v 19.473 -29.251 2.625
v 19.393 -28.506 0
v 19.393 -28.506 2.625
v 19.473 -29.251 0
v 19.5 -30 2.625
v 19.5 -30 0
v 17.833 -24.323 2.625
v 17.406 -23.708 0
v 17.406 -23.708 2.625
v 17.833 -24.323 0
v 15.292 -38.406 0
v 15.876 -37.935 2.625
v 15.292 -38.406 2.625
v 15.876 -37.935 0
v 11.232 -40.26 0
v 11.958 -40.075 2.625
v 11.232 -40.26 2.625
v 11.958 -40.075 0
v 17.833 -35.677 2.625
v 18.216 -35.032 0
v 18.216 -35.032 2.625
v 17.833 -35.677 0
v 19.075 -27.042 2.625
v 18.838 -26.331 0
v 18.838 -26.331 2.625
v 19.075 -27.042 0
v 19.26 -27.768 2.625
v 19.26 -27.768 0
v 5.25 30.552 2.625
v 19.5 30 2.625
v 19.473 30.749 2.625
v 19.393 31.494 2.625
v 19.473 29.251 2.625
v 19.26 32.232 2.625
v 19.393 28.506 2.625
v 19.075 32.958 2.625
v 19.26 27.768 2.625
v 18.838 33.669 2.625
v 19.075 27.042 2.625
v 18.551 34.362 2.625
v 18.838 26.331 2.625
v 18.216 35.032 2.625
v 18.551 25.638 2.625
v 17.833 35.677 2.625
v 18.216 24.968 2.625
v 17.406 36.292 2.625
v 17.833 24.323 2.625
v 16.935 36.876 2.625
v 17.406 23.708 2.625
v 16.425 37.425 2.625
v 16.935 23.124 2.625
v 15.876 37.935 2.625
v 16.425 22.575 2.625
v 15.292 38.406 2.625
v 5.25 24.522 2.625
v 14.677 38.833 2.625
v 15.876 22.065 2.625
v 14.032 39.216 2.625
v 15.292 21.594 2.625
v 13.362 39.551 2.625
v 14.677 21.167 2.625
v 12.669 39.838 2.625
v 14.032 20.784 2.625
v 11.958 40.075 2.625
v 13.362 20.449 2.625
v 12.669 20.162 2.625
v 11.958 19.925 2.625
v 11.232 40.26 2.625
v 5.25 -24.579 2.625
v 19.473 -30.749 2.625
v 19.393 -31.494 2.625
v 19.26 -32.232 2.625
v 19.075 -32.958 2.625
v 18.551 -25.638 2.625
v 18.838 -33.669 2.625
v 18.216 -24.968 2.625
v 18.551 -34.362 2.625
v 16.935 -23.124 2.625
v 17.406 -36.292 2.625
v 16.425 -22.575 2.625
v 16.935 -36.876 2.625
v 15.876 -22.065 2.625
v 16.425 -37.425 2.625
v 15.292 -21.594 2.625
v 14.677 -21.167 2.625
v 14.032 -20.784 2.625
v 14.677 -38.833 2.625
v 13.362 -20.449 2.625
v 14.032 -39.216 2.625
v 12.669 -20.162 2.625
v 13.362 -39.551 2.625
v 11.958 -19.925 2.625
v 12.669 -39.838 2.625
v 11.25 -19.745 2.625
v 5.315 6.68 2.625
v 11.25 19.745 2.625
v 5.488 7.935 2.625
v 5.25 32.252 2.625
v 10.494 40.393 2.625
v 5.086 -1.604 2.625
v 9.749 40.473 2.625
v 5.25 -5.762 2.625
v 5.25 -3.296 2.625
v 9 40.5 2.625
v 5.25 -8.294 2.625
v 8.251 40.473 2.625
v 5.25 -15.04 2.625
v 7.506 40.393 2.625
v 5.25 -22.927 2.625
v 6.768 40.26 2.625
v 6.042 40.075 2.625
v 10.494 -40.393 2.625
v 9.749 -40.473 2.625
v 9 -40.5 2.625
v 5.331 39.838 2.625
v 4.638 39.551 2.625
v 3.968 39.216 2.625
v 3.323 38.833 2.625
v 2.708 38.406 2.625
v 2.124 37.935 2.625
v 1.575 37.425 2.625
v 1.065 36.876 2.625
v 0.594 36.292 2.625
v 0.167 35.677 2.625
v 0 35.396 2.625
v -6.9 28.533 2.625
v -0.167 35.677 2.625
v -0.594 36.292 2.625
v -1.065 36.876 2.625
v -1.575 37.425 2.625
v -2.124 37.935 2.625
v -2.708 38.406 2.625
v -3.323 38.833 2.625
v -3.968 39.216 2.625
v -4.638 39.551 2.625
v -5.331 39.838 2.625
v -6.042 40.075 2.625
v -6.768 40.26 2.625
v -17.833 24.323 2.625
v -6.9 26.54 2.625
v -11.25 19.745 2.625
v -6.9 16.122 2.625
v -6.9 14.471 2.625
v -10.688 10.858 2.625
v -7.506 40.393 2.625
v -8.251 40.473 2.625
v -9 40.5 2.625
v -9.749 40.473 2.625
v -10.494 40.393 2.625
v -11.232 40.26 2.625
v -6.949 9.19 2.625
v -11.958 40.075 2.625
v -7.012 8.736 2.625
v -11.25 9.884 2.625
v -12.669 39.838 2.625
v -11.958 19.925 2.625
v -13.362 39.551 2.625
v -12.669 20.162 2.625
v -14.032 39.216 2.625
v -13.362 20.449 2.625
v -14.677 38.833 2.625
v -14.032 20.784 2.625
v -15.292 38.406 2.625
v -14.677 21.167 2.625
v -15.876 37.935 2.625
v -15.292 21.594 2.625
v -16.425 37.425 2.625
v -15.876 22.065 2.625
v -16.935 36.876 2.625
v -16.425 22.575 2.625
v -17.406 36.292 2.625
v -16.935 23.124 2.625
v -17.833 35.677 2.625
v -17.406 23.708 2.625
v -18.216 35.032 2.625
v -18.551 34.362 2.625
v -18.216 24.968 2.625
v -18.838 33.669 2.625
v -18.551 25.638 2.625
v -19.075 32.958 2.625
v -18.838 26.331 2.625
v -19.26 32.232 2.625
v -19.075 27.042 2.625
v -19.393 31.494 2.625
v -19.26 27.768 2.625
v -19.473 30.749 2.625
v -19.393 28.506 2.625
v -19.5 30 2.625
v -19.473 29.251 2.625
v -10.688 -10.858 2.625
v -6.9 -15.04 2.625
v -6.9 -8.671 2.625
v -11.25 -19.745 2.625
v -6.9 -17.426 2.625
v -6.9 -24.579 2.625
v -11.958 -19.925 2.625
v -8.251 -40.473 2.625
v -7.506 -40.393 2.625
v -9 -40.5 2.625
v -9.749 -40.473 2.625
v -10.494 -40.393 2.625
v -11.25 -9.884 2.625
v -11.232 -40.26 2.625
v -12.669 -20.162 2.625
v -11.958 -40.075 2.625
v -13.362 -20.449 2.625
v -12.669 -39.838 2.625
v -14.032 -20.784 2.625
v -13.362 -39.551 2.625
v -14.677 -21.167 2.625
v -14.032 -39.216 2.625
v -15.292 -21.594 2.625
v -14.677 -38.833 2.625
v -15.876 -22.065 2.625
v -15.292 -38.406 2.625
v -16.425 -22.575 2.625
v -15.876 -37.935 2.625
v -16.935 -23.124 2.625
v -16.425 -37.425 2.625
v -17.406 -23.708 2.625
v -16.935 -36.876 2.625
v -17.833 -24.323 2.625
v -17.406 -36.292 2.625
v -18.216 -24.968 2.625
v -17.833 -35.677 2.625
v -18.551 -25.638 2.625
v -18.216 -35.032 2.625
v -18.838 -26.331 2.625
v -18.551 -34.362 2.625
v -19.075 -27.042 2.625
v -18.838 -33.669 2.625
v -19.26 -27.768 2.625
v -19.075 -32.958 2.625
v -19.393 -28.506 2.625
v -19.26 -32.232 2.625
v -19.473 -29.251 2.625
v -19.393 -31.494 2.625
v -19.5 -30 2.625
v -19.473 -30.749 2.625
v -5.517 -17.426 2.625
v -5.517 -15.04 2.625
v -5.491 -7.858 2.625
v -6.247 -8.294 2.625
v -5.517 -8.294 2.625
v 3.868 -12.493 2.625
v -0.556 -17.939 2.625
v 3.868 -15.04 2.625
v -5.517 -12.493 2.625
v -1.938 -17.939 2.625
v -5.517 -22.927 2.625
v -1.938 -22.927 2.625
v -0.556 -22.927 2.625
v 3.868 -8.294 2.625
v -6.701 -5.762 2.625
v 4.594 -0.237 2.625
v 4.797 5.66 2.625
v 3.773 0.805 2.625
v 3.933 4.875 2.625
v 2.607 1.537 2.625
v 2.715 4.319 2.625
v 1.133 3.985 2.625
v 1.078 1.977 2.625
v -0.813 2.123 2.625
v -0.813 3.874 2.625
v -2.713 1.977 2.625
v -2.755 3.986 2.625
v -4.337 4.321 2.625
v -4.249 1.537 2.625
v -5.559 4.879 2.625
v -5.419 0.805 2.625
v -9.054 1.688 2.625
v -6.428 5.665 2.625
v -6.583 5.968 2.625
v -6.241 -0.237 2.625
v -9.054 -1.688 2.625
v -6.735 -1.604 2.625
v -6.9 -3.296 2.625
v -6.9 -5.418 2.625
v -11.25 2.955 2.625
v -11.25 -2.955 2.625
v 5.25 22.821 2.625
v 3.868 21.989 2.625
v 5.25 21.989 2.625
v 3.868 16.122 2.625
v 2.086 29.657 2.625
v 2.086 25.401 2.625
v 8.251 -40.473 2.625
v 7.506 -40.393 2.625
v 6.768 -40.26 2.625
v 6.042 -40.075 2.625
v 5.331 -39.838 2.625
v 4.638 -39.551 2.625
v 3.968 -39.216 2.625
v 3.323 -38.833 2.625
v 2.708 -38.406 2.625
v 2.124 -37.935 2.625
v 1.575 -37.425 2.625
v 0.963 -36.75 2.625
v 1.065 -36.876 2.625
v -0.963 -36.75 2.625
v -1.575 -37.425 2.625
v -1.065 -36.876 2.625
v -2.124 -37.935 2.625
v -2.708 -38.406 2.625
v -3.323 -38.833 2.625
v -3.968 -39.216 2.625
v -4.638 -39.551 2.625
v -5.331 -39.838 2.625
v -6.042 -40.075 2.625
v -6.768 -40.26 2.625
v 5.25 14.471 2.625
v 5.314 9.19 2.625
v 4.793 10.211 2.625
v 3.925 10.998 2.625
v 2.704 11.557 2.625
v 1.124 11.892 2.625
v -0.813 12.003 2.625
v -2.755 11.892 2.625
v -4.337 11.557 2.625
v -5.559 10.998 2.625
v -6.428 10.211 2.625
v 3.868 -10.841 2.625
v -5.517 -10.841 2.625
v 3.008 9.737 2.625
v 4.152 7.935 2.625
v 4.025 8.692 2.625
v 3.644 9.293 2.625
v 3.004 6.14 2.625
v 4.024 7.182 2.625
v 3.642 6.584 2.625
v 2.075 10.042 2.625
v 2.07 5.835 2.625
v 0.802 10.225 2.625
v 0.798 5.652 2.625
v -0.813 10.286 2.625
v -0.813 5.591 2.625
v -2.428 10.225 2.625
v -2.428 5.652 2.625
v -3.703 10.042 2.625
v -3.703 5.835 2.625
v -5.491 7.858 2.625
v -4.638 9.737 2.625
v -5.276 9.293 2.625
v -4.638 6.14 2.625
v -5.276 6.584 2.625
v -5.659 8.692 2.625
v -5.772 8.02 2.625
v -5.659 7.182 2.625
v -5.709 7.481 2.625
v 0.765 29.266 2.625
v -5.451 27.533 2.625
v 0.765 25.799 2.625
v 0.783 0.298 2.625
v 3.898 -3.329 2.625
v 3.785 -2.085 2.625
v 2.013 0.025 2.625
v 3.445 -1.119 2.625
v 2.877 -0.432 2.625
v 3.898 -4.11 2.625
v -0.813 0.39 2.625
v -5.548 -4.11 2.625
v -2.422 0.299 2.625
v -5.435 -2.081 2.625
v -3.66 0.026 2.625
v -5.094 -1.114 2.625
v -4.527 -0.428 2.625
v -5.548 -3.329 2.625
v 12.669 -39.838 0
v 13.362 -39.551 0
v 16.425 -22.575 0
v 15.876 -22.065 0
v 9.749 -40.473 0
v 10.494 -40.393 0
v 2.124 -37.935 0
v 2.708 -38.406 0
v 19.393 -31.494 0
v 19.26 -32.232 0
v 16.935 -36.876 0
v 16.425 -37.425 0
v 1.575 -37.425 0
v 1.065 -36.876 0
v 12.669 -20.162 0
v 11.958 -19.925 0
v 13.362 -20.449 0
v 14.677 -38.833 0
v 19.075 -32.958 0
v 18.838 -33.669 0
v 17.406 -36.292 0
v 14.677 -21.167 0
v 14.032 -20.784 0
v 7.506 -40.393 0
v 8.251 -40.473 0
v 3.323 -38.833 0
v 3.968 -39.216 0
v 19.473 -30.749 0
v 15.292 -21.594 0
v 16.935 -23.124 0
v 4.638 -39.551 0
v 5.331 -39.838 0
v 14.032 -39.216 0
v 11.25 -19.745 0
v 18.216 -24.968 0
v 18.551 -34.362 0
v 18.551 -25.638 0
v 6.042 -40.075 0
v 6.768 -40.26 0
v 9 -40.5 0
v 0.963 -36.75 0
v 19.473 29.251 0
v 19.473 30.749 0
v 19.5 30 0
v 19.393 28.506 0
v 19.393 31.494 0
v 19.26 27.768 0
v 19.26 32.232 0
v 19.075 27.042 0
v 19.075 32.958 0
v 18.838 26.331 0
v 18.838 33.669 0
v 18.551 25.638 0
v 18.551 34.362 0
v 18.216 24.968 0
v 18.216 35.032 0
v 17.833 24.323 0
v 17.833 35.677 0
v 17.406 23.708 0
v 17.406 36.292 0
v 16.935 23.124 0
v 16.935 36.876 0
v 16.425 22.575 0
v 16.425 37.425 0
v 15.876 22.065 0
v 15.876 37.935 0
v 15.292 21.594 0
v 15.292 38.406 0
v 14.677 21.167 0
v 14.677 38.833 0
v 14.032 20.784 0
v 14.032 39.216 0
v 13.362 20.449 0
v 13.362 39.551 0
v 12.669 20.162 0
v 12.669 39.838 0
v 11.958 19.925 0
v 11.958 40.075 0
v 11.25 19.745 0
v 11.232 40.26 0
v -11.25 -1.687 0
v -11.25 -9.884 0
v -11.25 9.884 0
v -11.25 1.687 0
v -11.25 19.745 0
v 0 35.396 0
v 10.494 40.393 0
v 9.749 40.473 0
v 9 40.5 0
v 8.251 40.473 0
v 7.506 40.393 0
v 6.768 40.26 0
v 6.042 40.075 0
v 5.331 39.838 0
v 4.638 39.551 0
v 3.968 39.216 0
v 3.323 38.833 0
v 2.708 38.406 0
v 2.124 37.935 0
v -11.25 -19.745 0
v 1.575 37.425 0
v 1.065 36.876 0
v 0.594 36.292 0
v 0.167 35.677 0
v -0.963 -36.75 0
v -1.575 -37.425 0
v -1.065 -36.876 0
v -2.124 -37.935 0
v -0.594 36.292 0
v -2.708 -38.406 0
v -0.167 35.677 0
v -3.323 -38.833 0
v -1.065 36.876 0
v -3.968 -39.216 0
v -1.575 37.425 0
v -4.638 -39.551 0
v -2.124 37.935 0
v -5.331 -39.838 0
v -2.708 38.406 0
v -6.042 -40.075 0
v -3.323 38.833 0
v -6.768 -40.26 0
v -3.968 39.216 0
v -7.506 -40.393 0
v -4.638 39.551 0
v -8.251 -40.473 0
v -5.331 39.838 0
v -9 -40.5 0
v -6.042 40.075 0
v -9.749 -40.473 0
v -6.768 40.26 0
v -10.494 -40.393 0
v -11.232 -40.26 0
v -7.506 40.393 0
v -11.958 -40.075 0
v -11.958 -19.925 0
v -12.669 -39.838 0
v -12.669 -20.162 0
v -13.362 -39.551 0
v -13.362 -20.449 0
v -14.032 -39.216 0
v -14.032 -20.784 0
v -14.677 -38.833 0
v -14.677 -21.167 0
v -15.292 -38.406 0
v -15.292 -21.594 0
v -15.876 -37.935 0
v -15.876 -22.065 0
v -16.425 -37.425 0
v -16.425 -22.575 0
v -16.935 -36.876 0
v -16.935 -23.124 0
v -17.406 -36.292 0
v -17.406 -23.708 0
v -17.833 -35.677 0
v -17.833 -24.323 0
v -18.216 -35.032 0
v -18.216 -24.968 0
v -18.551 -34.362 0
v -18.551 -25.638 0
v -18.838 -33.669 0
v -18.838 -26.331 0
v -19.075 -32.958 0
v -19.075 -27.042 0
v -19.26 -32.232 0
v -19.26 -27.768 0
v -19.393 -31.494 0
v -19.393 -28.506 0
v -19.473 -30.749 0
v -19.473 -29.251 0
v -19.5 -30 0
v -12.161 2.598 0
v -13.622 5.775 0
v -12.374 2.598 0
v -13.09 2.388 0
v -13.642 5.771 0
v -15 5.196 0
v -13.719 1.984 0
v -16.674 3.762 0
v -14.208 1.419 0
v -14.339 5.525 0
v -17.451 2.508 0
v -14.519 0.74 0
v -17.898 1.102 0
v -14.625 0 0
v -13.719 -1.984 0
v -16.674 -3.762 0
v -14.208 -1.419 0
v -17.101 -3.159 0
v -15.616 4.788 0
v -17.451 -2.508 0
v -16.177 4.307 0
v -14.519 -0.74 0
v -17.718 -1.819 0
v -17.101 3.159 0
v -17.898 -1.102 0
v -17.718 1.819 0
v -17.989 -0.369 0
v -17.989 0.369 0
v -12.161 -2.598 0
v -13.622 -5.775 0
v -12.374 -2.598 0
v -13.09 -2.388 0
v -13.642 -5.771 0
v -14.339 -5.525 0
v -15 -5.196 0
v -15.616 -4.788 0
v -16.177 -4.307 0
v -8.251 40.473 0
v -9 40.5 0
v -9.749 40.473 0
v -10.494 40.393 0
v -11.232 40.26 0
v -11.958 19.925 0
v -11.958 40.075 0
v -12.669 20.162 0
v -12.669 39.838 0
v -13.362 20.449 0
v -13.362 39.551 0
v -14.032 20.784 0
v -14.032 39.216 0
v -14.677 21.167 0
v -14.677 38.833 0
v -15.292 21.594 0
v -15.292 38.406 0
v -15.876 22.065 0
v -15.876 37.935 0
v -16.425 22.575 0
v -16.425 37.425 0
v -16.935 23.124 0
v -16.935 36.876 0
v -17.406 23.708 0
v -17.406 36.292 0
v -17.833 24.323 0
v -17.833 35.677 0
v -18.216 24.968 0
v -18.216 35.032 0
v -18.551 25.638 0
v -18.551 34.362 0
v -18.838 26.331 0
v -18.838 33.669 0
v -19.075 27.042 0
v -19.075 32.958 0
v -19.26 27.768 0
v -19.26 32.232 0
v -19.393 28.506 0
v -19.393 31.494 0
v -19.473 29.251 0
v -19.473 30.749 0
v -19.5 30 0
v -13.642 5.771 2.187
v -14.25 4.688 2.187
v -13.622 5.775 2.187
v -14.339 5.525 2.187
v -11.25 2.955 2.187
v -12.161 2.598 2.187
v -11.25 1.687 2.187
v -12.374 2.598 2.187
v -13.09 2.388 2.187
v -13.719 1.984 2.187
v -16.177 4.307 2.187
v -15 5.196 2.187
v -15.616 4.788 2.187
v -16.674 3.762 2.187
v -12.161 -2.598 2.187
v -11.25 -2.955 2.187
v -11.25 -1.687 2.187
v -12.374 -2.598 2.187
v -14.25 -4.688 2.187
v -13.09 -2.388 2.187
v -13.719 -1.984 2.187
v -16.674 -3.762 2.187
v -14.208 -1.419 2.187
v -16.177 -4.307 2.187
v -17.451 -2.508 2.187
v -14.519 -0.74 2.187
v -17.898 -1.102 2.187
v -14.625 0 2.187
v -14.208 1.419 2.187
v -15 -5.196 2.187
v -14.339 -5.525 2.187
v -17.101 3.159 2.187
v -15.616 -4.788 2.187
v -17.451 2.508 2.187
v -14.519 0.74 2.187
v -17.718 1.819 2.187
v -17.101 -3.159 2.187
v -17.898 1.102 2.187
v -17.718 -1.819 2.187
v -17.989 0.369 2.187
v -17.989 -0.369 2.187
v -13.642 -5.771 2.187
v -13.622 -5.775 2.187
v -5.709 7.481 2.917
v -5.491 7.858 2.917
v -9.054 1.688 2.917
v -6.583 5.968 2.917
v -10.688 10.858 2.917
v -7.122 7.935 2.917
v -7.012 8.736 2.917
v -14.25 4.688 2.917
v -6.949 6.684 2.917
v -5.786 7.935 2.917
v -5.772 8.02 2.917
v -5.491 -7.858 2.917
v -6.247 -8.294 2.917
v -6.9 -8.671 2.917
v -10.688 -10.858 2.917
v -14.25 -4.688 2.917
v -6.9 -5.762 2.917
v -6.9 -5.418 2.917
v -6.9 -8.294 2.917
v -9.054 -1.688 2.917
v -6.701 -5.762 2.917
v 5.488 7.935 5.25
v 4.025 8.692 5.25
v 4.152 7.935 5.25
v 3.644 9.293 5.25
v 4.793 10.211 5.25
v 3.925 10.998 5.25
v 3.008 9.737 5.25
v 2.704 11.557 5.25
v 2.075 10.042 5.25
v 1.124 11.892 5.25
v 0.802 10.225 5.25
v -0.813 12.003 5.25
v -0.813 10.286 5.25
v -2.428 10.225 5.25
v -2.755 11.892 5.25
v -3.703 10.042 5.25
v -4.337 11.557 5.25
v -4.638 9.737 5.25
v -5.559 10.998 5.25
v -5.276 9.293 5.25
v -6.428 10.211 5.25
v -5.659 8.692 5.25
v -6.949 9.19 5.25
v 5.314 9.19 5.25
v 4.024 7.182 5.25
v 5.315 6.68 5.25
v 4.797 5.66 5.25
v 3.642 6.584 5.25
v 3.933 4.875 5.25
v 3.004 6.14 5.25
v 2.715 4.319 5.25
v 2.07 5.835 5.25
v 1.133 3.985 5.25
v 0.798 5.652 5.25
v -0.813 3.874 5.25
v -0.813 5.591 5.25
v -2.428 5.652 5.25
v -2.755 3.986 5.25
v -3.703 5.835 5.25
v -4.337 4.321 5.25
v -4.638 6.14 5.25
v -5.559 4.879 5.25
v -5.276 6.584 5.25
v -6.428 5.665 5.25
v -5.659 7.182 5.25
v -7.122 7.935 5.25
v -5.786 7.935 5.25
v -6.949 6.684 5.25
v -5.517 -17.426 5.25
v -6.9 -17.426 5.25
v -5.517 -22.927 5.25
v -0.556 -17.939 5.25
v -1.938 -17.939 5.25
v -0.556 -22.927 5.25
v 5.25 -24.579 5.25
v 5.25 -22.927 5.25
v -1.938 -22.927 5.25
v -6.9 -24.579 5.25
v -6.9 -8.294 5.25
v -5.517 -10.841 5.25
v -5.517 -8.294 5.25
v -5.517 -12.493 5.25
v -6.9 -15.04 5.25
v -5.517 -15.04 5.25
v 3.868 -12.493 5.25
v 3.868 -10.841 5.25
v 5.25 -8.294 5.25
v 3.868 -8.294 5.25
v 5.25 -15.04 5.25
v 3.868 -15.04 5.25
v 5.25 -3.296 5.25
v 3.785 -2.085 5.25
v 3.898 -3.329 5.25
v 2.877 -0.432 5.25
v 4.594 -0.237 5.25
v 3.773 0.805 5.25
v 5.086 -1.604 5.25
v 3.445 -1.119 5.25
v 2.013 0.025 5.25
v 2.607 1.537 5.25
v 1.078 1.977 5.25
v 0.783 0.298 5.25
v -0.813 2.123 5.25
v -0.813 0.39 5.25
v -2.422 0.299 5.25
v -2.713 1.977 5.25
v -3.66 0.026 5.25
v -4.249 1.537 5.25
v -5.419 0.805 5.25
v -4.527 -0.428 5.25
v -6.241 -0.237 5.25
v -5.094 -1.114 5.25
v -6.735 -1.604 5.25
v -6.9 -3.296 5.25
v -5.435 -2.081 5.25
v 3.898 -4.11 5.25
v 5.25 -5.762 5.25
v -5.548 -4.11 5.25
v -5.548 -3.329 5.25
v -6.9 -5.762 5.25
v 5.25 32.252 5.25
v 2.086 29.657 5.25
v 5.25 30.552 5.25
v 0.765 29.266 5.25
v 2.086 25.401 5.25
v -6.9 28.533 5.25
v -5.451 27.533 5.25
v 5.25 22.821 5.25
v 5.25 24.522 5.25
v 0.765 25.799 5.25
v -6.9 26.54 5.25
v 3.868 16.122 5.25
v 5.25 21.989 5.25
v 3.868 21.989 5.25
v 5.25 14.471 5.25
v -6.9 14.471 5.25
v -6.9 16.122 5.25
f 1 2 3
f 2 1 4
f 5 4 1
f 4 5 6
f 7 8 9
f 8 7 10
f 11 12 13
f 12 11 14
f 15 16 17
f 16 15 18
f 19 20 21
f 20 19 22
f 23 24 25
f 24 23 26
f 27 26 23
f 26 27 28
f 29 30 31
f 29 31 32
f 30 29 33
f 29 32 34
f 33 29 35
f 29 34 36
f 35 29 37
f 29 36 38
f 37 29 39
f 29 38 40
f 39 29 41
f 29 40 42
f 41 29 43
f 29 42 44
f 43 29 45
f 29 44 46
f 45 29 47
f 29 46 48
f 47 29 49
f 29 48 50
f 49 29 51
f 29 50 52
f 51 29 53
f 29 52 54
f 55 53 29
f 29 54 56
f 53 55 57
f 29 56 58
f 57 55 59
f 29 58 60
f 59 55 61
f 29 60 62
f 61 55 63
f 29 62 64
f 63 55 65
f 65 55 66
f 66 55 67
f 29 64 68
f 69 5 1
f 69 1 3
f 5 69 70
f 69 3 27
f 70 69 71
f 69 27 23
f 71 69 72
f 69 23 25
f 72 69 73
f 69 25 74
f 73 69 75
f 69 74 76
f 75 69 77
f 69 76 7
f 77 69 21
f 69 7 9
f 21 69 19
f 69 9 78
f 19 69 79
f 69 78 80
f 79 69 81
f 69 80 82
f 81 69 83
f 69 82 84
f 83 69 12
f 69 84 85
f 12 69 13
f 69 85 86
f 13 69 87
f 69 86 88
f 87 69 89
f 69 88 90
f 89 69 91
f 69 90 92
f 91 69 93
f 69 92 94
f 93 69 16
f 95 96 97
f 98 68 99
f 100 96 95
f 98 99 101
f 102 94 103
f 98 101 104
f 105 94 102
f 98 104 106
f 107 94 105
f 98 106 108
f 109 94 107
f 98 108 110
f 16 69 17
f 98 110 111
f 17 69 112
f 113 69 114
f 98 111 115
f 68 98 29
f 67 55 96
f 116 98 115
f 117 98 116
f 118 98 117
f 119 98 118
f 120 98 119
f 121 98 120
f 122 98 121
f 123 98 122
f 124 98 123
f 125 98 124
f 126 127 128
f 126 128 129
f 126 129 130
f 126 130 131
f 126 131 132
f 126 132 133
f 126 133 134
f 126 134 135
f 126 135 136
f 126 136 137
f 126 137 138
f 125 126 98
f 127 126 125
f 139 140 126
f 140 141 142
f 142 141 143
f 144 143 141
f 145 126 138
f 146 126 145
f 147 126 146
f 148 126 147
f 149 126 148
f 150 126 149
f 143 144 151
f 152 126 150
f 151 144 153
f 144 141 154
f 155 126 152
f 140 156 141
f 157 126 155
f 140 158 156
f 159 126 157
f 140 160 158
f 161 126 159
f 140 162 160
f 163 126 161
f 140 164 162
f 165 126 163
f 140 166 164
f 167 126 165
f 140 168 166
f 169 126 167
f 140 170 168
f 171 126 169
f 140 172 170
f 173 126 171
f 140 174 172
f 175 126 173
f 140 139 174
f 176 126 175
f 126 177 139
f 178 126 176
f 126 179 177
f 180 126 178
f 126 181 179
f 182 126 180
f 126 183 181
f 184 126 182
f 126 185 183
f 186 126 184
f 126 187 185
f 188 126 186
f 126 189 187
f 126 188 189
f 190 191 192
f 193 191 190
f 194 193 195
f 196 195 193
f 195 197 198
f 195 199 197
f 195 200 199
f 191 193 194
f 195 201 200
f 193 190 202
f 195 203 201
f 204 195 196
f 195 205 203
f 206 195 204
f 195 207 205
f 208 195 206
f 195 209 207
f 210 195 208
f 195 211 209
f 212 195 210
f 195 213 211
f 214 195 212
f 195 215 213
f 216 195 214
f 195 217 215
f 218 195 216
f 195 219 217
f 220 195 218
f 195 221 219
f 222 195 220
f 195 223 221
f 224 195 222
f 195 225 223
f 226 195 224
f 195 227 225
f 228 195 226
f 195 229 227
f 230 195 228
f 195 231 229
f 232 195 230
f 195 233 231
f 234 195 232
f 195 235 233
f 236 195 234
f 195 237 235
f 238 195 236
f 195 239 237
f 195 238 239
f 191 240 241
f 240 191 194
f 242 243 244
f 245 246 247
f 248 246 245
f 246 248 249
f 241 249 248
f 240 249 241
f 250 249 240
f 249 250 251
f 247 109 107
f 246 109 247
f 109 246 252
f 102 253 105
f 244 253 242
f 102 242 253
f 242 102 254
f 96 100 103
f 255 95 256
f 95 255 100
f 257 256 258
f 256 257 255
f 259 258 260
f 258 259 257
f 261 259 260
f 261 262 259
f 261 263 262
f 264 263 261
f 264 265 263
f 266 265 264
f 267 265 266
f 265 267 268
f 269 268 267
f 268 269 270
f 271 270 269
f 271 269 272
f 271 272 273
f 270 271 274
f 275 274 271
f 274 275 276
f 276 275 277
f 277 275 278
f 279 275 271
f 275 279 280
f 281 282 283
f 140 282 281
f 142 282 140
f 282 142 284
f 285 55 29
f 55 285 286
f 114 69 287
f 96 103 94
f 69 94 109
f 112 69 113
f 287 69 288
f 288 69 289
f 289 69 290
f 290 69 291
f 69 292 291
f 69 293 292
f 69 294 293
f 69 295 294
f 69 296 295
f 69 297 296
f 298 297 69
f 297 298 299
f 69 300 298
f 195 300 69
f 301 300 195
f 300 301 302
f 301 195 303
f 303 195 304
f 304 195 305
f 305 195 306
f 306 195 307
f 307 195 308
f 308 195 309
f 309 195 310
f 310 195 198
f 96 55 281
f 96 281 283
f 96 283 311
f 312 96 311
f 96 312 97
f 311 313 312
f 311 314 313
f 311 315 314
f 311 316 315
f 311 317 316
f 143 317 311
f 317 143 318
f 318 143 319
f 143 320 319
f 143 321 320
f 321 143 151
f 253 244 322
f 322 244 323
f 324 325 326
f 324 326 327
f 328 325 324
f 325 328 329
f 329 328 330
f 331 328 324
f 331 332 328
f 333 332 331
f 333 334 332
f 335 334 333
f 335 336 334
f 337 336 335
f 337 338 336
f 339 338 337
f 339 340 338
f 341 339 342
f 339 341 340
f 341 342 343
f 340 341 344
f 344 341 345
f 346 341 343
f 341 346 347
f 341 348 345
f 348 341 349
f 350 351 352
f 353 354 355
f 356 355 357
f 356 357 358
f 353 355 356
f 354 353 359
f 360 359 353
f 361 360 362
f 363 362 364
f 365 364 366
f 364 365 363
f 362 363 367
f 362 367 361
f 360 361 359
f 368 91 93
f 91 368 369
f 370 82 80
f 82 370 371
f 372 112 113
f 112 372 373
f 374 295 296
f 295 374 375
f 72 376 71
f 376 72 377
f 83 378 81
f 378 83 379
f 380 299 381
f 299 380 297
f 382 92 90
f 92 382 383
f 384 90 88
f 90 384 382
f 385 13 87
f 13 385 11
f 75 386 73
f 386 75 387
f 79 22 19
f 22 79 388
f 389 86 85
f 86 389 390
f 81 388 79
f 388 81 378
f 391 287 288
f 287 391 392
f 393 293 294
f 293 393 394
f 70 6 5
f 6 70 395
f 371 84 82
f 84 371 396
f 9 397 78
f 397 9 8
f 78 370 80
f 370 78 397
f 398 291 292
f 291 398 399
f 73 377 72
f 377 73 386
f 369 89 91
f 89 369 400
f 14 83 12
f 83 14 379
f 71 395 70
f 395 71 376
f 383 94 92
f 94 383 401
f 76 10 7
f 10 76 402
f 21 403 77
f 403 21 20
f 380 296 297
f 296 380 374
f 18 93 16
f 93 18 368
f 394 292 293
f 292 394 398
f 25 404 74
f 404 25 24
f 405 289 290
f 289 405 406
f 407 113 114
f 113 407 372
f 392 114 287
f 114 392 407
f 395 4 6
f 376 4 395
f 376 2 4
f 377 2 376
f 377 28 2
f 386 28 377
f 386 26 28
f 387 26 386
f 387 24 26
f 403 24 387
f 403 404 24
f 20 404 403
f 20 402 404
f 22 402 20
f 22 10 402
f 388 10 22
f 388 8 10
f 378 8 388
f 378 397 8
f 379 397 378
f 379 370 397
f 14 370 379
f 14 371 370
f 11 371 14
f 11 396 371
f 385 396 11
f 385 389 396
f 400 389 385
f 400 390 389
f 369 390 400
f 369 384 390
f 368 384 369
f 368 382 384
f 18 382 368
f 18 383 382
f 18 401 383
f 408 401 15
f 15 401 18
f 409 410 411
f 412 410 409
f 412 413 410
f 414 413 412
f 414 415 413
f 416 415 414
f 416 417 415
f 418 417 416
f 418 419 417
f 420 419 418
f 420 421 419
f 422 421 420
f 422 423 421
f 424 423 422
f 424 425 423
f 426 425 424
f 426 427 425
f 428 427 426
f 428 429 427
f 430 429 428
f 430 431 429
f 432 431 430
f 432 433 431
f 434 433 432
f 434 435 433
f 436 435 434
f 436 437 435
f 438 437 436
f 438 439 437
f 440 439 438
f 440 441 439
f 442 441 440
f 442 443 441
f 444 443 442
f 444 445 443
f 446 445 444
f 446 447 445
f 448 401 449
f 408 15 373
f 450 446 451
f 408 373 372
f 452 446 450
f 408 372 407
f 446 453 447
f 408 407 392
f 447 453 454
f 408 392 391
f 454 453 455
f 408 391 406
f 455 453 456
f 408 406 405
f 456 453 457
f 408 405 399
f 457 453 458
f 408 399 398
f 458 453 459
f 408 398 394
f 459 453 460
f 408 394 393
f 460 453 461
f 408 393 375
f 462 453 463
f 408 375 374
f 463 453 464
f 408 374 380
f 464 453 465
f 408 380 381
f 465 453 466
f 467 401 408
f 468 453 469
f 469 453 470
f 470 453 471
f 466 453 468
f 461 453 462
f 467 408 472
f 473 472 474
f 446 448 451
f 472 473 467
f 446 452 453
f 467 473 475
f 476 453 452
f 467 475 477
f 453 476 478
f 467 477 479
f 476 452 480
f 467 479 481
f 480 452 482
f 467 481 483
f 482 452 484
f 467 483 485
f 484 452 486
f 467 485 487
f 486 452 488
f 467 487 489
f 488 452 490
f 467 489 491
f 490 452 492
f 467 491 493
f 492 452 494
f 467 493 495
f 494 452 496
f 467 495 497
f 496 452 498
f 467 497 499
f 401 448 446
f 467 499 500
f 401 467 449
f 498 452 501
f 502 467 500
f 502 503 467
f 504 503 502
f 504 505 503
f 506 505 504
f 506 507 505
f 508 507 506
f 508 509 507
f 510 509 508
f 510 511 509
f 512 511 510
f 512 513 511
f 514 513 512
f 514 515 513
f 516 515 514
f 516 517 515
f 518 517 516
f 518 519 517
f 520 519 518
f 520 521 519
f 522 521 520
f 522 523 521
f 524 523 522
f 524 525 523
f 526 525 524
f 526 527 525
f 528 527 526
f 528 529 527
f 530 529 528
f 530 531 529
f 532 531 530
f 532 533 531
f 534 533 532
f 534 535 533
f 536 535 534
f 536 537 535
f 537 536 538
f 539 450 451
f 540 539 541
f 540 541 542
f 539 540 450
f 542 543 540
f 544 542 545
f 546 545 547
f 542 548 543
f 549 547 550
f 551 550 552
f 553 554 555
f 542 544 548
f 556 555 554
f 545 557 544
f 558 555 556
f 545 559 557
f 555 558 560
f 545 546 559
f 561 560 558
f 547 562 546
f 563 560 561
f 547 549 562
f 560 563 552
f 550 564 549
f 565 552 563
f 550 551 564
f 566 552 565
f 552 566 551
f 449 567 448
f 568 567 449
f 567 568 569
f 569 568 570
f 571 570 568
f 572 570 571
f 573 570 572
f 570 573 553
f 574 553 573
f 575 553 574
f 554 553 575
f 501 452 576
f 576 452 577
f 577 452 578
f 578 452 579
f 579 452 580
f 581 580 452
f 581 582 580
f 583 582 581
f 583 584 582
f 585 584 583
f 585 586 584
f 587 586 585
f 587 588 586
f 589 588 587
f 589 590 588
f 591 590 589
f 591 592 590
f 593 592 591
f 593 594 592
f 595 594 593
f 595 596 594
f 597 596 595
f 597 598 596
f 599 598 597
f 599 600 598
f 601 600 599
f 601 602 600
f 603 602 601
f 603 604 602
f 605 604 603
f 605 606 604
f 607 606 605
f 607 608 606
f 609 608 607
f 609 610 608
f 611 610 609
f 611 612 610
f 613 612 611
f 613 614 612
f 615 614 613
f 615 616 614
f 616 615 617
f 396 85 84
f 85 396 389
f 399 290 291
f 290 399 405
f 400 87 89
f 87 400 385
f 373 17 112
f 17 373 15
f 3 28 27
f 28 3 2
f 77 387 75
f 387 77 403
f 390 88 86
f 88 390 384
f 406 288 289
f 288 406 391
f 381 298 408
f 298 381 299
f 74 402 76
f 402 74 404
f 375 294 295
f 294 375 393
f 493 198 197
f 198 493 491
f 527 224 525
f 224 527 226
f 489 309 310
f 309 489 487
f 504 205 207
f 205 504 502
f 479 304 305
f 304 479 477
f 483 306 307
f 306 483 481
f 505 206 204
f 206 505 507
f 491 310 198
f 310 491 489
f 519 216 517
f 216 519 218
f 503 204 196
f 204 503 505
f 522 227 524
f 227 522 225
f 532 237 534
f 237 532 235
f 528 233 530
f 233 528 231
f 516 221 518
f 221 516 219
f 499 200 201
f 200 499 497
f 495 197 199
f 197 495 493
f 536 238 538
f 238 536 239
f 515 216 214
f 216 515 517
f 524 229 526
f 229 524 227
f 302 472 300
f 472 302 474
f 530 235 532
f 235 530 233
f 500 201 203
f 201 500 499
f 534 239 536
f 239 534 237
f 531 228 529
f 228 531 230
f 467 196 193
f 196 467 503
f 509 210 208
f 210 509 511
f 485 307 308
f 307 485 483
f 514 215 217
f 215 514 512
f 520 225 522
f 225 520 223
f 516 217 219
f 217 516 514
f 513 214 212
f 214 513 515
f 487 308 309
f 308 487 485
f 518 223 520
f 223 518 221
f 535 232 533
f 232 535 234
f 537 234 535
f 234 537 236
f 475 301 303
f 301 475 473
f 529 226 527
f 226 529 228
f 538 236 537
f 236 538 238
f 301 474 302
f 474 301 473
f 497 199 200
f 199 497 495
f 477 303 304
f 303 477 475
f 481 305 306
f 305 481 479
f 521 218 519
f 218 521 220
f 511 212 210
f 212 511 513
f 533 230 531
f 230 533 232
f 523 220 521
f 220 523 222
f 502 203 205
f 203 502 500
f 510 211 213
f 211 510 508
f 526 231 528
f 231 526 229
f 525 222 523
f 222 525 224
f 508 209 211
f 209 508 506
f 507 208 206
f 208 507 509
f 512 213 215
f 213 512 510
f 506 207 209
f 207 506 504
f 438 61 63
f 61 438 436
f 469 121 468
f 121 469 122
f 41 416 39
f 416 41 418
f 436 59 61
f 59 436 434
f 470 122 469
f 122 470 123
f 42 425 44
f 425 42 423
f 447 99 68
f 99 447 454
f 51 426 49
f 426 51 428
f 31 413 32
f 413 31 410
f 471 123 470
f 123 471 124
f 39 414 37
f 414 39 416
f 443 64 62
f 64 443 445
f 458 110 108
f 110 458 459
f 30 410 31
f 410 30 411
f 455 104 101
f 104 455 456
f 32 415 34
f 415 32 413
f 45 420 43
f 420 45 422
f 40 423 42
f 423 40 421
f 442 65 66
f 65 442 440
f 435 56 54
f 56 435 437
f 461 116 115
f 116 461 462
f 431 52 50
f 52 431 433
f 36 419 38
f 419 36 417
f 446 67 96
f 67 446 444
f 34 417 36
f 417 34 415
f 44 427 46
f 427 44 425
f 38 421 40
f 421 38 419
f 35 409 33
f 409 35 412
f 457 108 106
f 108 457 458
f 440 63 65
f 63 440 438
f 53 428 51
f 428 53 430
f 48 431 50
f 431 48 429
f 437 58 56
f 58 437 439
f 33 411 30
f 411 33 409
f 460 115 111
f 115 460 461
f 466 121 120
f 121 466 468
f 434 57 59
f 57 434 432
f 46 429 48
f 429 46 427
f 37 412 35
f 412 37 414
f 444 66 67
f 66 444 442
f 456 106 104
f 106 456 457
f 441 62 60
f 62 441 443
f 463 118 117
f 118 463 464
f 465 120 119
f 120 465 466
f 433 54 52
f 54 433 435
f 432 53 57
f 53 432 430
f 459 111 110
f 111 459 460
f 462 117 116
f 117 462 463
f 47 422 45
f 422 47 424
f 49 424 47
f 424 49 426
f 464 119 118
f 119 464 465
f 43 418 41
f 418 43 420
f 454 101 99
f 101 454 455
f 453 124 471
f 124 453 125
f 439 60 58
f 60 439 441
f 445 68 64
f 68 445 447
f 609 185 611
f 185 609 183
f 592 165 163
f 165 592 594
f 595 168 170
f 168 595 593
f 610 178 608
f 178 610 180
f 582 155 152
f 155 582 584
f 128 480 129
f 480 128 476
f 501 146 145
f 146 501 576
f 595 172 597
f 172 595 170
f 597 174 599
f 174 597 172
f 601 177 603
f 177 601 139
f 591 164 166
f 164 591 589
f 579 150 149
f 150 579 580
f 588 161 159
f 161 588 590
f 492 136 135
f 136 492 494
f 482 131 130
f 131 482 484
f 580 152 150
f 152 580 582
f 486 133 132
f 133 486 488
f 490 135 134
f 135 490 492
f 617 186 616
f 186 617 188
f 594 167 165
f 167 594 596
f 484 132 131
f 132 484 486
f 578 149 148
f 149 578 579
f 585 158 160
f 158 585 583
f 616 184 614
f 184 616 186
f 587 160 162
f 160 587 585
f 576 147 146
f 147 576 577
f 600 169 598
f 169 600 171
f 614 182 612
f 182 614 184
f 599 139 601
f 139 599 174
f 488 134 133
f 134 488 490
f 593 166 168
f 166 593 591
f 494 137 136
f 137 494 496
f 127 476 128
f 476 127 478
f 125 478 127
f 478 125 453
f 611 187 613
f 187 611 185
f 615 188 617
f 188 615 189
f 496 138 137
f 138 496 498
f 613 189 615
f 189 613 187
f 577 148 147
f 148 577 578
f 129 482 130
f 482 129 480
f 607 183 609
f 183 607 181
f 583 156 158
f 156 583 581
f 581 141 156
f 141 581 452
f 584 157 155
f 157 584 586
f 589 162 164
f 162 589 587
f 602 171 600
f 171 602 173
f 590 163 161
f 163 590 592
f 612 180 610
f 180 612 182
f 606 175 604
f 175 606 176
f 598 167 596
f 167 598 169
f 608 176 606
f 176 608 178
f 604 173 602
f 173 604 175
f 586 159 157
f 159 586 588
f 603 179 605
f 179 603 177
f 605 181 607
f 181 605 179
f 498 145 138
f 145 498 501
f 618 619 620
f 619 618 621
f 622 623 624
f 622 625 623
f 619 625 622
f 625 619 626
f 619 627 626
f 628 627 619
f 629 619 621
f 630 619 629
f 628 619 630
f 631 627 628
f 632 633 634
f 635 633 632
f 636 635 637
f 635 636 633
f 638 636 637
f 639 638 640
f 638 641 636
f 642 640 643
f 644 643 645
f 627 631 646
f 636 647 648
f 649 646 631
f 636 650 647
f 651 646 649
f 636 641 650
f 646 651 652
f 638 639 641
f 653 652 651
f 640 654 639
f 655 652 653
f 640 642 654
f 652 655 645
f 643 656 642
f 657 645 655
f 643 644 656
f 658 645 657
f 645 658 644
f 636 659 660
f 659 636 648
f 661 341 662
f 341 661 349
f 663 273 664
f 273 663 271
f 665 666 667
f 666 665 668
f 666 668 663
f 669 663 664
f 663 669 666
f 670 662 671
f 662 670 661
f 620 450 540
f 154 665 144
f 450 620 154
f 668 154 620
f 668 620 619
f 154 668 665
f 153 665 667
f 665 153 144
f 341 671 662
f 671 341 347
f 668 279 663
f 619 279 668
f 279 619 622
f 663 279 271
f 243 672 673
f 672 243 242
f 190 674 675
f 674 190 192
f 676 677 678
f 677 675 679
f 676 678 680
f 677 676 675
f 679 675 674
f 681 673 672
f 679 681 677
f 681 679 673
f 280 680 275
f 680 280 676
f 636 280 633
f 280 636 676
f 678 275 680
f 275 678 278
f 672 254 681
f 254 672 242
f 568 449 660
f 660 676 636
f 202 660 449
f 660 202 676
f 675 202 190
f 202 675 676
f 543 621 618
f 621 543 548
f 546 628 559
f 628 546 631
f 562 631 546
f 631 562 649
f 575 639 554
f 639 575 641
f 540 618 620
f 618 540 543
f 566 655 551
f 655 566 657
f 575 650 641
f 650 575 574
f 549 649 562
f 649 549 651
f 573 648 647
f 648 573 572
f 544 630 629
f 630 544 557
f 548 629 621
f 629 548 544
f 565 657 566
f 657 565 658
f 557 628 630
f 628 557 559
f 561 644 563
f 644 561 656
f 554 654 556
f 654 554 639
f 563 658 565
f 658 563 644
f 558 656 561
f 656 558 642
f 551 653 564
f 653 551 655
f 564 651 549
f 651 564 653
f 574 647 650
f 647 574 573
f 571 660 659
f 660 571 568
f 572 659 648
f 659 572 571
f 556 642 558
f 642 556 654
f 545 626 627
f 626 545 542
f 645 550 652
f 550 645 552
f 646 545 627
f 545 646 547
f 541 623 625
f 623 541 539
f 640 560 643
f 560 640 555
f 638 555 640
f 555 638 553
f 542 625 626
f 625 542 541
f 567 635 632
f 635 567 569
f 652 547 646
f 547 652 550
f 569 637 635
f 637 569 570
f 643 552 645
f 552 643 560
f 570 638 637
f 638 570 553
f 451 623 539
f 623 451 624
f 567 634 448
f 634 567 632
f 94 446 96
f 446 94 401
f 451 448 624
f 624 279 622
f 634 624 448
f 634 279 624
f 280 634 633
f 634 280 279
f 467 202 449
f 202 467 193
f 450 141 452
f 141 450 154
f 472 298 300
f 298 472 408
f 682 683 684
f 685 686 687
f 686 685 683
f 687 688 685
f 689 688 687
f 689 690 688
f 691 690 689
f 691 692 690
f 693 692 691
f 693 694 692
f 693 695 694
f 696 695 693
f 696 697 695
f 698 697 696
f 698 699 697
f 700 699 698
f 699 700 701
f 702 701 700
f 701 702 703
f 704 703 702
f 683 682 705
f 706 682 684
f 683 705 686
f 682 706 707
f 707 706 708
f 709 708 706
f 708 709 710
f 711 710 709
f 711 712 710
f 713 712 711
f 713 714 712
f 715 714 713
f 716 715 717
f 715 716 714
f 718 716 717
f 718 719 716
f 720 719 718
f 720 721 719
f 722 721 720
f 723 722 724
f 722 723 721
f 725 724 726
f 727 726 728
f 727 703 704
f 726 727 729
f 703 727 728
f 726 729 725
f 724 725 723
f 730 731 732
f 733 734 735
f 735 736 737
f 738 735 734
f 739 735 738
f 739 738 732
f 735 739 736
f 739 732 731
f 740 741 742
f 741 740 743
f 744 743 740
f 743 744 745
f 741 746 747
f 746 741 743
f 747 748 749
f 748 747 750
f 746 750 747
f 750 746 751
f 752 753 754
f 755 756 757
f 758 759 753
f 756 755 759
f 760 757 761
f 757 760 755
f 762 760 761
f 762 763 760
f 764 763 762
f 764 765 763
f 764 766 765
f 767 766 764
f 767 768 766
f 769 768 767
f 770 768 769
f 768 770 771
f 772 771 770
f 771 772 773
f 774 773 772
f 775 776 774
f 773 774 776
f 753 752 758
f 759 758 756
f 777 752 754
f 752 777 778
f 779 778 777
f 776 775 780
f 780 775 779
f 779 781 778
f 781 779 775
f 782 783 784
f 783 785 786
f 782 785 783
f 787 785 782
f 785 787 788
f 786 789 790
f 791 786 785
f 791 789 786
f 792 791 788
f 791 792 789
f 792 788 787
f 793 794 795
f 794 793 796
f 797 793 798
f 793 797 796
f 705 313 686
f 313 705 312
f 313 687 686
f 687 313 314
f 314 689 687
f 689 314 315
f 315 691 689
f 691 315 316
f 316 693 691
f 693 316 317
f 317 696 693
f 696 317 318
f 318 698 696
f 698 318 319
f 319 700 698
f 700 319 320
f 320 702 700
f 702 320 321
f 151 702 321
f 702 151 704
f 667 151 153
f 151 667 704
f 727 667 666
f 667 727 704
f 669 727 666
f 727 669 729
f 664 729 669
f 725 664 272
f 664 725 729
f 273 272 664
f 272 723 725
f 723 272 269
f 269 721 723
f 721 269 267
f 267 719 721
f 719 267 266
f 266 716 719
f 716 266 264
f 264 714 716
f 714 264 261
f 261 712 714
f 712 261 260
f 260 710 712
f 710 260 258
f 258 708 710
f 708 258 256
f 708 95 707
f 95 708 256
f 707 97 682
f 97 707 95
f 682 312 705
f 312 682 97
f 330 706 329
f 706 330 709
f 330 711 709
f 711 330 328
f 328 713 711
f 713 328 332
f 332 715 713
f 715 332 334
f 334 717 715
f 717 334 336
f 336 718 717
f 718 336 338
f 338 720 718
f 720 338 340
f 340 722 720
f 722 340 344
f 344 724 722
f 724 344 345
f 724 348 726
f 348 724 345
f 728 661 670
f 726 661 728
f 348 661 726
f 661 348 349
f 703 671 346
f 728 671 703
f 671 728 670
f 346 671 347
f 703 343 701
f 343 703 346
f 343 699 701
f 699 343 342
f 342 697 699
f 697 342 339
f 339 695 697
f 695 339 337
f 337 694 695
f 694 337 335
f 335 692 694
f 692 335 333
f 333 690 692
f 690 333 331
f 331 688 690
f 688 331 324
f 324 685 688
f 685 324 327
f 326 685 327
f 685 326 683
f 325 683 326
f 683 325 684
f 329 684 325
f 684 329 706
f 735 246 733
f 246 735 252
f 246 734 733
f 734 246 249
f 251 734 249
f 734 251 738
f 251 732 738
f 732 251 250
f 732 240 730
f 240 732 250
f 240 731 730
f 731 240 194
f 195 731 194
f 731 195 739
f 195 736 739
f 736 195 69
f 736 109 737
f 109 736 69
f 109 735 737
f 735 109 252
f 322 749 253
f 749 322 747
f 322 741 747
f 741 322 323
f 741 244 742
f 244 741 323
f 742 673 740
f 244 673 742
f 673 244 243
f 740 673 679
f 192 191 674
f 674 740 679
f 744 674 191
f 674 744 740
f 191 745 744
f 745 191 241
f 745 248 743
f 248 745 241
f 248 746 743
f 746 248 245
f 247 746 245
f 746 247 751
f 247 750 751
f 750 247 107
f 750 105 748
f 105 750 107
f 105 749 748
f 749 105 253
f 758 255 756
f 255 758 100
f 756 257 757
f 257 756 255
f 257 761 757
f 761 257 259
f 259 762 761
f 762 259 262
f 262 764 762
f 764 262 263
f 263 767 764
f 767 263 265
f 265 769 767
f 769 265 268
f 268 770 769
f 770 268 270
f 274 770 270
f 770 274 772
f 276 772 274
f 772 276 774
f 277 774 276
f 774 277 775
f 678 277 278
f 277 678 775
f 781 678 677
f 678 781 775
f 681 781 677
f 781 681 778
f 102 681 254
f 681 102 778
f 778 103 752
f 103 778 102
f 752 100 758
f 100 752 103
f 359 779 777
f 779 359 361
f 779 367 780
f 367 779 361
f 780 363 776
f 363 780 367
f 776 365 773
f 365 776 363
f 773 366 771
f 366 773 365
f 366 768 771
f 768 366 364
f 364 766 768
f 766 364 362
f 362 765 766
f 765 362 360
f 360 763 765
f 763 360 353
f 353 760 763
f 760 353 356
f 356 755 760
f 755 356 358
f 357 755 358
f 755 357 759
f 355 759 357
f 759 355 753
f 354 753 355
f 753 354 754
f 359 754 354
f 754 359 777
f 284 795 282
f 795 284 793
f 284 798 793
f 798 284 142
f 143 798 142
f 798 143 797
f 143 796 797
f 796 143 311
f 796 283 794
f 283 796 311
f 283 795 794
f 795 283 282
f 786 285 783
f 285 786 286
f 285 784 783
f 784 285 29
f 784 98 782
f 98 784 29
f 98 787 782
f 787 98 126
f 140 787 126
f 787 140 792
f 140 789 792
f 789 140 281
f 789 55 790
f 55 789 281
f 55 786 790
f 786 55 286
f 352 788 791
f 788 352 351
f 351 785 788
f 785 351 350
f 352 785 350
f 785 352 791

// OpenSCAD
$fa=1;
$fs=1;
bone_height = 3.5;//set this to how thick you want the tag
pet_name="FIDOLA";
//phone_number="123.555.1212";
font_face="Consolas";
font_thickness=3.5;

tag_attachment_outer_diameter = 8;
tag_attachment_inner_diameter = 3.5;
tag_attachment_width = (tag_attachment_outer_diameter - tag_attachment_inner_diameter);
tag_attachment_height = bone_height*5/6;
tag_attachment_flare_width = 8;

module t(t){
 translate([-1,(-len(t)*3.8),bone_height])
   rotate([0, 0, 90])
    linear_extrude(height = font_thickness)
      text(t, 16, font = str(font_face), $fn = 16);
}
//bone
//left side of bone

scale([1,1,1]*0.75) {
translate([-12,-40,0])
{
    translate([24,0,0]) cylinder(h=bone_height, r=14);
    cylinder(h=bone_height, r=14);
};
//right side of bone
translate([-12,40,0])
{
    translate([24,0,0]) cylinder(h=bone_height, r=14);
    cylinder(h=bone_height, r=14);
};

//center of bone
translate([-15,-49,0]) cube([30,90,bone_height]);

translate([8,-12.5,0]) t(pet_name);
// translate([12,0,0]) t(phone_number);

//tag attachment
difference(){
    union() {
        translate([-16,0,0]) {

            cylinder(r=tag_attachment_outer_diameter, h=tag_attachment_height);

            // add flares at attachment point for more area
            translate([-3,tag_attachment_outer_diameter/2 + tag_attachment_width/2 ,0])
            {
                rotate([0,0,-45]) {
                    cube([tag_attachment_flare_width , tag_attachment_flare_width ,tag_attachment_height]);
                }
                rotate([0,0, -30 ]) {
                    cube([tag_attachment_flare_width , tag_attachment_flare_width + 1.5 ,tag_attachment_height * 4/3]);
                }

            };
           translate([-3,-(tag_attachment_outer_diameter/2 + tag_attachment_width/2) ,0])
            {
                rotate([0,0,-45]) {
                    cube([tag_attachment_flare_width , tag_attachment_flare_width ,tag_attachment_height]);
                }
                rotate([0,0,-60]) {
                    cube([tag_attachment_flare_width + 1.5 , tag_attachment_flare_width ,tag_attachment_height * 4/3]);
                }

            };
        }
    }
    //prevents non-manifold
    translate([-16,0,-1]) cylinder(r=tag_attachment_inner_diameter, h=((bone_height*2/3)+2));
}


translate([-16,0,0]) {

  // add flares at attachment point for more area
  translate([-3,tag_attachment_outer_diameter/2 + tag_attachment_width/2 ,0])
  {
    rotate([0,0,-45]) {
      cube([tag_attachment_flare_width , tag_attachment_flare_width ,tag_attachment_height]);
    }
  };
  translate([-3,-(tag_attachment_outer_diameter/2 + tag_attachment_width/2) ,0])
  {
    rotate([0,0,-45]) {
      cube([tag_attachment_flare_width , tag_attachment_flare_width ,tag_attachment_height]);
    }
  };
}


}
